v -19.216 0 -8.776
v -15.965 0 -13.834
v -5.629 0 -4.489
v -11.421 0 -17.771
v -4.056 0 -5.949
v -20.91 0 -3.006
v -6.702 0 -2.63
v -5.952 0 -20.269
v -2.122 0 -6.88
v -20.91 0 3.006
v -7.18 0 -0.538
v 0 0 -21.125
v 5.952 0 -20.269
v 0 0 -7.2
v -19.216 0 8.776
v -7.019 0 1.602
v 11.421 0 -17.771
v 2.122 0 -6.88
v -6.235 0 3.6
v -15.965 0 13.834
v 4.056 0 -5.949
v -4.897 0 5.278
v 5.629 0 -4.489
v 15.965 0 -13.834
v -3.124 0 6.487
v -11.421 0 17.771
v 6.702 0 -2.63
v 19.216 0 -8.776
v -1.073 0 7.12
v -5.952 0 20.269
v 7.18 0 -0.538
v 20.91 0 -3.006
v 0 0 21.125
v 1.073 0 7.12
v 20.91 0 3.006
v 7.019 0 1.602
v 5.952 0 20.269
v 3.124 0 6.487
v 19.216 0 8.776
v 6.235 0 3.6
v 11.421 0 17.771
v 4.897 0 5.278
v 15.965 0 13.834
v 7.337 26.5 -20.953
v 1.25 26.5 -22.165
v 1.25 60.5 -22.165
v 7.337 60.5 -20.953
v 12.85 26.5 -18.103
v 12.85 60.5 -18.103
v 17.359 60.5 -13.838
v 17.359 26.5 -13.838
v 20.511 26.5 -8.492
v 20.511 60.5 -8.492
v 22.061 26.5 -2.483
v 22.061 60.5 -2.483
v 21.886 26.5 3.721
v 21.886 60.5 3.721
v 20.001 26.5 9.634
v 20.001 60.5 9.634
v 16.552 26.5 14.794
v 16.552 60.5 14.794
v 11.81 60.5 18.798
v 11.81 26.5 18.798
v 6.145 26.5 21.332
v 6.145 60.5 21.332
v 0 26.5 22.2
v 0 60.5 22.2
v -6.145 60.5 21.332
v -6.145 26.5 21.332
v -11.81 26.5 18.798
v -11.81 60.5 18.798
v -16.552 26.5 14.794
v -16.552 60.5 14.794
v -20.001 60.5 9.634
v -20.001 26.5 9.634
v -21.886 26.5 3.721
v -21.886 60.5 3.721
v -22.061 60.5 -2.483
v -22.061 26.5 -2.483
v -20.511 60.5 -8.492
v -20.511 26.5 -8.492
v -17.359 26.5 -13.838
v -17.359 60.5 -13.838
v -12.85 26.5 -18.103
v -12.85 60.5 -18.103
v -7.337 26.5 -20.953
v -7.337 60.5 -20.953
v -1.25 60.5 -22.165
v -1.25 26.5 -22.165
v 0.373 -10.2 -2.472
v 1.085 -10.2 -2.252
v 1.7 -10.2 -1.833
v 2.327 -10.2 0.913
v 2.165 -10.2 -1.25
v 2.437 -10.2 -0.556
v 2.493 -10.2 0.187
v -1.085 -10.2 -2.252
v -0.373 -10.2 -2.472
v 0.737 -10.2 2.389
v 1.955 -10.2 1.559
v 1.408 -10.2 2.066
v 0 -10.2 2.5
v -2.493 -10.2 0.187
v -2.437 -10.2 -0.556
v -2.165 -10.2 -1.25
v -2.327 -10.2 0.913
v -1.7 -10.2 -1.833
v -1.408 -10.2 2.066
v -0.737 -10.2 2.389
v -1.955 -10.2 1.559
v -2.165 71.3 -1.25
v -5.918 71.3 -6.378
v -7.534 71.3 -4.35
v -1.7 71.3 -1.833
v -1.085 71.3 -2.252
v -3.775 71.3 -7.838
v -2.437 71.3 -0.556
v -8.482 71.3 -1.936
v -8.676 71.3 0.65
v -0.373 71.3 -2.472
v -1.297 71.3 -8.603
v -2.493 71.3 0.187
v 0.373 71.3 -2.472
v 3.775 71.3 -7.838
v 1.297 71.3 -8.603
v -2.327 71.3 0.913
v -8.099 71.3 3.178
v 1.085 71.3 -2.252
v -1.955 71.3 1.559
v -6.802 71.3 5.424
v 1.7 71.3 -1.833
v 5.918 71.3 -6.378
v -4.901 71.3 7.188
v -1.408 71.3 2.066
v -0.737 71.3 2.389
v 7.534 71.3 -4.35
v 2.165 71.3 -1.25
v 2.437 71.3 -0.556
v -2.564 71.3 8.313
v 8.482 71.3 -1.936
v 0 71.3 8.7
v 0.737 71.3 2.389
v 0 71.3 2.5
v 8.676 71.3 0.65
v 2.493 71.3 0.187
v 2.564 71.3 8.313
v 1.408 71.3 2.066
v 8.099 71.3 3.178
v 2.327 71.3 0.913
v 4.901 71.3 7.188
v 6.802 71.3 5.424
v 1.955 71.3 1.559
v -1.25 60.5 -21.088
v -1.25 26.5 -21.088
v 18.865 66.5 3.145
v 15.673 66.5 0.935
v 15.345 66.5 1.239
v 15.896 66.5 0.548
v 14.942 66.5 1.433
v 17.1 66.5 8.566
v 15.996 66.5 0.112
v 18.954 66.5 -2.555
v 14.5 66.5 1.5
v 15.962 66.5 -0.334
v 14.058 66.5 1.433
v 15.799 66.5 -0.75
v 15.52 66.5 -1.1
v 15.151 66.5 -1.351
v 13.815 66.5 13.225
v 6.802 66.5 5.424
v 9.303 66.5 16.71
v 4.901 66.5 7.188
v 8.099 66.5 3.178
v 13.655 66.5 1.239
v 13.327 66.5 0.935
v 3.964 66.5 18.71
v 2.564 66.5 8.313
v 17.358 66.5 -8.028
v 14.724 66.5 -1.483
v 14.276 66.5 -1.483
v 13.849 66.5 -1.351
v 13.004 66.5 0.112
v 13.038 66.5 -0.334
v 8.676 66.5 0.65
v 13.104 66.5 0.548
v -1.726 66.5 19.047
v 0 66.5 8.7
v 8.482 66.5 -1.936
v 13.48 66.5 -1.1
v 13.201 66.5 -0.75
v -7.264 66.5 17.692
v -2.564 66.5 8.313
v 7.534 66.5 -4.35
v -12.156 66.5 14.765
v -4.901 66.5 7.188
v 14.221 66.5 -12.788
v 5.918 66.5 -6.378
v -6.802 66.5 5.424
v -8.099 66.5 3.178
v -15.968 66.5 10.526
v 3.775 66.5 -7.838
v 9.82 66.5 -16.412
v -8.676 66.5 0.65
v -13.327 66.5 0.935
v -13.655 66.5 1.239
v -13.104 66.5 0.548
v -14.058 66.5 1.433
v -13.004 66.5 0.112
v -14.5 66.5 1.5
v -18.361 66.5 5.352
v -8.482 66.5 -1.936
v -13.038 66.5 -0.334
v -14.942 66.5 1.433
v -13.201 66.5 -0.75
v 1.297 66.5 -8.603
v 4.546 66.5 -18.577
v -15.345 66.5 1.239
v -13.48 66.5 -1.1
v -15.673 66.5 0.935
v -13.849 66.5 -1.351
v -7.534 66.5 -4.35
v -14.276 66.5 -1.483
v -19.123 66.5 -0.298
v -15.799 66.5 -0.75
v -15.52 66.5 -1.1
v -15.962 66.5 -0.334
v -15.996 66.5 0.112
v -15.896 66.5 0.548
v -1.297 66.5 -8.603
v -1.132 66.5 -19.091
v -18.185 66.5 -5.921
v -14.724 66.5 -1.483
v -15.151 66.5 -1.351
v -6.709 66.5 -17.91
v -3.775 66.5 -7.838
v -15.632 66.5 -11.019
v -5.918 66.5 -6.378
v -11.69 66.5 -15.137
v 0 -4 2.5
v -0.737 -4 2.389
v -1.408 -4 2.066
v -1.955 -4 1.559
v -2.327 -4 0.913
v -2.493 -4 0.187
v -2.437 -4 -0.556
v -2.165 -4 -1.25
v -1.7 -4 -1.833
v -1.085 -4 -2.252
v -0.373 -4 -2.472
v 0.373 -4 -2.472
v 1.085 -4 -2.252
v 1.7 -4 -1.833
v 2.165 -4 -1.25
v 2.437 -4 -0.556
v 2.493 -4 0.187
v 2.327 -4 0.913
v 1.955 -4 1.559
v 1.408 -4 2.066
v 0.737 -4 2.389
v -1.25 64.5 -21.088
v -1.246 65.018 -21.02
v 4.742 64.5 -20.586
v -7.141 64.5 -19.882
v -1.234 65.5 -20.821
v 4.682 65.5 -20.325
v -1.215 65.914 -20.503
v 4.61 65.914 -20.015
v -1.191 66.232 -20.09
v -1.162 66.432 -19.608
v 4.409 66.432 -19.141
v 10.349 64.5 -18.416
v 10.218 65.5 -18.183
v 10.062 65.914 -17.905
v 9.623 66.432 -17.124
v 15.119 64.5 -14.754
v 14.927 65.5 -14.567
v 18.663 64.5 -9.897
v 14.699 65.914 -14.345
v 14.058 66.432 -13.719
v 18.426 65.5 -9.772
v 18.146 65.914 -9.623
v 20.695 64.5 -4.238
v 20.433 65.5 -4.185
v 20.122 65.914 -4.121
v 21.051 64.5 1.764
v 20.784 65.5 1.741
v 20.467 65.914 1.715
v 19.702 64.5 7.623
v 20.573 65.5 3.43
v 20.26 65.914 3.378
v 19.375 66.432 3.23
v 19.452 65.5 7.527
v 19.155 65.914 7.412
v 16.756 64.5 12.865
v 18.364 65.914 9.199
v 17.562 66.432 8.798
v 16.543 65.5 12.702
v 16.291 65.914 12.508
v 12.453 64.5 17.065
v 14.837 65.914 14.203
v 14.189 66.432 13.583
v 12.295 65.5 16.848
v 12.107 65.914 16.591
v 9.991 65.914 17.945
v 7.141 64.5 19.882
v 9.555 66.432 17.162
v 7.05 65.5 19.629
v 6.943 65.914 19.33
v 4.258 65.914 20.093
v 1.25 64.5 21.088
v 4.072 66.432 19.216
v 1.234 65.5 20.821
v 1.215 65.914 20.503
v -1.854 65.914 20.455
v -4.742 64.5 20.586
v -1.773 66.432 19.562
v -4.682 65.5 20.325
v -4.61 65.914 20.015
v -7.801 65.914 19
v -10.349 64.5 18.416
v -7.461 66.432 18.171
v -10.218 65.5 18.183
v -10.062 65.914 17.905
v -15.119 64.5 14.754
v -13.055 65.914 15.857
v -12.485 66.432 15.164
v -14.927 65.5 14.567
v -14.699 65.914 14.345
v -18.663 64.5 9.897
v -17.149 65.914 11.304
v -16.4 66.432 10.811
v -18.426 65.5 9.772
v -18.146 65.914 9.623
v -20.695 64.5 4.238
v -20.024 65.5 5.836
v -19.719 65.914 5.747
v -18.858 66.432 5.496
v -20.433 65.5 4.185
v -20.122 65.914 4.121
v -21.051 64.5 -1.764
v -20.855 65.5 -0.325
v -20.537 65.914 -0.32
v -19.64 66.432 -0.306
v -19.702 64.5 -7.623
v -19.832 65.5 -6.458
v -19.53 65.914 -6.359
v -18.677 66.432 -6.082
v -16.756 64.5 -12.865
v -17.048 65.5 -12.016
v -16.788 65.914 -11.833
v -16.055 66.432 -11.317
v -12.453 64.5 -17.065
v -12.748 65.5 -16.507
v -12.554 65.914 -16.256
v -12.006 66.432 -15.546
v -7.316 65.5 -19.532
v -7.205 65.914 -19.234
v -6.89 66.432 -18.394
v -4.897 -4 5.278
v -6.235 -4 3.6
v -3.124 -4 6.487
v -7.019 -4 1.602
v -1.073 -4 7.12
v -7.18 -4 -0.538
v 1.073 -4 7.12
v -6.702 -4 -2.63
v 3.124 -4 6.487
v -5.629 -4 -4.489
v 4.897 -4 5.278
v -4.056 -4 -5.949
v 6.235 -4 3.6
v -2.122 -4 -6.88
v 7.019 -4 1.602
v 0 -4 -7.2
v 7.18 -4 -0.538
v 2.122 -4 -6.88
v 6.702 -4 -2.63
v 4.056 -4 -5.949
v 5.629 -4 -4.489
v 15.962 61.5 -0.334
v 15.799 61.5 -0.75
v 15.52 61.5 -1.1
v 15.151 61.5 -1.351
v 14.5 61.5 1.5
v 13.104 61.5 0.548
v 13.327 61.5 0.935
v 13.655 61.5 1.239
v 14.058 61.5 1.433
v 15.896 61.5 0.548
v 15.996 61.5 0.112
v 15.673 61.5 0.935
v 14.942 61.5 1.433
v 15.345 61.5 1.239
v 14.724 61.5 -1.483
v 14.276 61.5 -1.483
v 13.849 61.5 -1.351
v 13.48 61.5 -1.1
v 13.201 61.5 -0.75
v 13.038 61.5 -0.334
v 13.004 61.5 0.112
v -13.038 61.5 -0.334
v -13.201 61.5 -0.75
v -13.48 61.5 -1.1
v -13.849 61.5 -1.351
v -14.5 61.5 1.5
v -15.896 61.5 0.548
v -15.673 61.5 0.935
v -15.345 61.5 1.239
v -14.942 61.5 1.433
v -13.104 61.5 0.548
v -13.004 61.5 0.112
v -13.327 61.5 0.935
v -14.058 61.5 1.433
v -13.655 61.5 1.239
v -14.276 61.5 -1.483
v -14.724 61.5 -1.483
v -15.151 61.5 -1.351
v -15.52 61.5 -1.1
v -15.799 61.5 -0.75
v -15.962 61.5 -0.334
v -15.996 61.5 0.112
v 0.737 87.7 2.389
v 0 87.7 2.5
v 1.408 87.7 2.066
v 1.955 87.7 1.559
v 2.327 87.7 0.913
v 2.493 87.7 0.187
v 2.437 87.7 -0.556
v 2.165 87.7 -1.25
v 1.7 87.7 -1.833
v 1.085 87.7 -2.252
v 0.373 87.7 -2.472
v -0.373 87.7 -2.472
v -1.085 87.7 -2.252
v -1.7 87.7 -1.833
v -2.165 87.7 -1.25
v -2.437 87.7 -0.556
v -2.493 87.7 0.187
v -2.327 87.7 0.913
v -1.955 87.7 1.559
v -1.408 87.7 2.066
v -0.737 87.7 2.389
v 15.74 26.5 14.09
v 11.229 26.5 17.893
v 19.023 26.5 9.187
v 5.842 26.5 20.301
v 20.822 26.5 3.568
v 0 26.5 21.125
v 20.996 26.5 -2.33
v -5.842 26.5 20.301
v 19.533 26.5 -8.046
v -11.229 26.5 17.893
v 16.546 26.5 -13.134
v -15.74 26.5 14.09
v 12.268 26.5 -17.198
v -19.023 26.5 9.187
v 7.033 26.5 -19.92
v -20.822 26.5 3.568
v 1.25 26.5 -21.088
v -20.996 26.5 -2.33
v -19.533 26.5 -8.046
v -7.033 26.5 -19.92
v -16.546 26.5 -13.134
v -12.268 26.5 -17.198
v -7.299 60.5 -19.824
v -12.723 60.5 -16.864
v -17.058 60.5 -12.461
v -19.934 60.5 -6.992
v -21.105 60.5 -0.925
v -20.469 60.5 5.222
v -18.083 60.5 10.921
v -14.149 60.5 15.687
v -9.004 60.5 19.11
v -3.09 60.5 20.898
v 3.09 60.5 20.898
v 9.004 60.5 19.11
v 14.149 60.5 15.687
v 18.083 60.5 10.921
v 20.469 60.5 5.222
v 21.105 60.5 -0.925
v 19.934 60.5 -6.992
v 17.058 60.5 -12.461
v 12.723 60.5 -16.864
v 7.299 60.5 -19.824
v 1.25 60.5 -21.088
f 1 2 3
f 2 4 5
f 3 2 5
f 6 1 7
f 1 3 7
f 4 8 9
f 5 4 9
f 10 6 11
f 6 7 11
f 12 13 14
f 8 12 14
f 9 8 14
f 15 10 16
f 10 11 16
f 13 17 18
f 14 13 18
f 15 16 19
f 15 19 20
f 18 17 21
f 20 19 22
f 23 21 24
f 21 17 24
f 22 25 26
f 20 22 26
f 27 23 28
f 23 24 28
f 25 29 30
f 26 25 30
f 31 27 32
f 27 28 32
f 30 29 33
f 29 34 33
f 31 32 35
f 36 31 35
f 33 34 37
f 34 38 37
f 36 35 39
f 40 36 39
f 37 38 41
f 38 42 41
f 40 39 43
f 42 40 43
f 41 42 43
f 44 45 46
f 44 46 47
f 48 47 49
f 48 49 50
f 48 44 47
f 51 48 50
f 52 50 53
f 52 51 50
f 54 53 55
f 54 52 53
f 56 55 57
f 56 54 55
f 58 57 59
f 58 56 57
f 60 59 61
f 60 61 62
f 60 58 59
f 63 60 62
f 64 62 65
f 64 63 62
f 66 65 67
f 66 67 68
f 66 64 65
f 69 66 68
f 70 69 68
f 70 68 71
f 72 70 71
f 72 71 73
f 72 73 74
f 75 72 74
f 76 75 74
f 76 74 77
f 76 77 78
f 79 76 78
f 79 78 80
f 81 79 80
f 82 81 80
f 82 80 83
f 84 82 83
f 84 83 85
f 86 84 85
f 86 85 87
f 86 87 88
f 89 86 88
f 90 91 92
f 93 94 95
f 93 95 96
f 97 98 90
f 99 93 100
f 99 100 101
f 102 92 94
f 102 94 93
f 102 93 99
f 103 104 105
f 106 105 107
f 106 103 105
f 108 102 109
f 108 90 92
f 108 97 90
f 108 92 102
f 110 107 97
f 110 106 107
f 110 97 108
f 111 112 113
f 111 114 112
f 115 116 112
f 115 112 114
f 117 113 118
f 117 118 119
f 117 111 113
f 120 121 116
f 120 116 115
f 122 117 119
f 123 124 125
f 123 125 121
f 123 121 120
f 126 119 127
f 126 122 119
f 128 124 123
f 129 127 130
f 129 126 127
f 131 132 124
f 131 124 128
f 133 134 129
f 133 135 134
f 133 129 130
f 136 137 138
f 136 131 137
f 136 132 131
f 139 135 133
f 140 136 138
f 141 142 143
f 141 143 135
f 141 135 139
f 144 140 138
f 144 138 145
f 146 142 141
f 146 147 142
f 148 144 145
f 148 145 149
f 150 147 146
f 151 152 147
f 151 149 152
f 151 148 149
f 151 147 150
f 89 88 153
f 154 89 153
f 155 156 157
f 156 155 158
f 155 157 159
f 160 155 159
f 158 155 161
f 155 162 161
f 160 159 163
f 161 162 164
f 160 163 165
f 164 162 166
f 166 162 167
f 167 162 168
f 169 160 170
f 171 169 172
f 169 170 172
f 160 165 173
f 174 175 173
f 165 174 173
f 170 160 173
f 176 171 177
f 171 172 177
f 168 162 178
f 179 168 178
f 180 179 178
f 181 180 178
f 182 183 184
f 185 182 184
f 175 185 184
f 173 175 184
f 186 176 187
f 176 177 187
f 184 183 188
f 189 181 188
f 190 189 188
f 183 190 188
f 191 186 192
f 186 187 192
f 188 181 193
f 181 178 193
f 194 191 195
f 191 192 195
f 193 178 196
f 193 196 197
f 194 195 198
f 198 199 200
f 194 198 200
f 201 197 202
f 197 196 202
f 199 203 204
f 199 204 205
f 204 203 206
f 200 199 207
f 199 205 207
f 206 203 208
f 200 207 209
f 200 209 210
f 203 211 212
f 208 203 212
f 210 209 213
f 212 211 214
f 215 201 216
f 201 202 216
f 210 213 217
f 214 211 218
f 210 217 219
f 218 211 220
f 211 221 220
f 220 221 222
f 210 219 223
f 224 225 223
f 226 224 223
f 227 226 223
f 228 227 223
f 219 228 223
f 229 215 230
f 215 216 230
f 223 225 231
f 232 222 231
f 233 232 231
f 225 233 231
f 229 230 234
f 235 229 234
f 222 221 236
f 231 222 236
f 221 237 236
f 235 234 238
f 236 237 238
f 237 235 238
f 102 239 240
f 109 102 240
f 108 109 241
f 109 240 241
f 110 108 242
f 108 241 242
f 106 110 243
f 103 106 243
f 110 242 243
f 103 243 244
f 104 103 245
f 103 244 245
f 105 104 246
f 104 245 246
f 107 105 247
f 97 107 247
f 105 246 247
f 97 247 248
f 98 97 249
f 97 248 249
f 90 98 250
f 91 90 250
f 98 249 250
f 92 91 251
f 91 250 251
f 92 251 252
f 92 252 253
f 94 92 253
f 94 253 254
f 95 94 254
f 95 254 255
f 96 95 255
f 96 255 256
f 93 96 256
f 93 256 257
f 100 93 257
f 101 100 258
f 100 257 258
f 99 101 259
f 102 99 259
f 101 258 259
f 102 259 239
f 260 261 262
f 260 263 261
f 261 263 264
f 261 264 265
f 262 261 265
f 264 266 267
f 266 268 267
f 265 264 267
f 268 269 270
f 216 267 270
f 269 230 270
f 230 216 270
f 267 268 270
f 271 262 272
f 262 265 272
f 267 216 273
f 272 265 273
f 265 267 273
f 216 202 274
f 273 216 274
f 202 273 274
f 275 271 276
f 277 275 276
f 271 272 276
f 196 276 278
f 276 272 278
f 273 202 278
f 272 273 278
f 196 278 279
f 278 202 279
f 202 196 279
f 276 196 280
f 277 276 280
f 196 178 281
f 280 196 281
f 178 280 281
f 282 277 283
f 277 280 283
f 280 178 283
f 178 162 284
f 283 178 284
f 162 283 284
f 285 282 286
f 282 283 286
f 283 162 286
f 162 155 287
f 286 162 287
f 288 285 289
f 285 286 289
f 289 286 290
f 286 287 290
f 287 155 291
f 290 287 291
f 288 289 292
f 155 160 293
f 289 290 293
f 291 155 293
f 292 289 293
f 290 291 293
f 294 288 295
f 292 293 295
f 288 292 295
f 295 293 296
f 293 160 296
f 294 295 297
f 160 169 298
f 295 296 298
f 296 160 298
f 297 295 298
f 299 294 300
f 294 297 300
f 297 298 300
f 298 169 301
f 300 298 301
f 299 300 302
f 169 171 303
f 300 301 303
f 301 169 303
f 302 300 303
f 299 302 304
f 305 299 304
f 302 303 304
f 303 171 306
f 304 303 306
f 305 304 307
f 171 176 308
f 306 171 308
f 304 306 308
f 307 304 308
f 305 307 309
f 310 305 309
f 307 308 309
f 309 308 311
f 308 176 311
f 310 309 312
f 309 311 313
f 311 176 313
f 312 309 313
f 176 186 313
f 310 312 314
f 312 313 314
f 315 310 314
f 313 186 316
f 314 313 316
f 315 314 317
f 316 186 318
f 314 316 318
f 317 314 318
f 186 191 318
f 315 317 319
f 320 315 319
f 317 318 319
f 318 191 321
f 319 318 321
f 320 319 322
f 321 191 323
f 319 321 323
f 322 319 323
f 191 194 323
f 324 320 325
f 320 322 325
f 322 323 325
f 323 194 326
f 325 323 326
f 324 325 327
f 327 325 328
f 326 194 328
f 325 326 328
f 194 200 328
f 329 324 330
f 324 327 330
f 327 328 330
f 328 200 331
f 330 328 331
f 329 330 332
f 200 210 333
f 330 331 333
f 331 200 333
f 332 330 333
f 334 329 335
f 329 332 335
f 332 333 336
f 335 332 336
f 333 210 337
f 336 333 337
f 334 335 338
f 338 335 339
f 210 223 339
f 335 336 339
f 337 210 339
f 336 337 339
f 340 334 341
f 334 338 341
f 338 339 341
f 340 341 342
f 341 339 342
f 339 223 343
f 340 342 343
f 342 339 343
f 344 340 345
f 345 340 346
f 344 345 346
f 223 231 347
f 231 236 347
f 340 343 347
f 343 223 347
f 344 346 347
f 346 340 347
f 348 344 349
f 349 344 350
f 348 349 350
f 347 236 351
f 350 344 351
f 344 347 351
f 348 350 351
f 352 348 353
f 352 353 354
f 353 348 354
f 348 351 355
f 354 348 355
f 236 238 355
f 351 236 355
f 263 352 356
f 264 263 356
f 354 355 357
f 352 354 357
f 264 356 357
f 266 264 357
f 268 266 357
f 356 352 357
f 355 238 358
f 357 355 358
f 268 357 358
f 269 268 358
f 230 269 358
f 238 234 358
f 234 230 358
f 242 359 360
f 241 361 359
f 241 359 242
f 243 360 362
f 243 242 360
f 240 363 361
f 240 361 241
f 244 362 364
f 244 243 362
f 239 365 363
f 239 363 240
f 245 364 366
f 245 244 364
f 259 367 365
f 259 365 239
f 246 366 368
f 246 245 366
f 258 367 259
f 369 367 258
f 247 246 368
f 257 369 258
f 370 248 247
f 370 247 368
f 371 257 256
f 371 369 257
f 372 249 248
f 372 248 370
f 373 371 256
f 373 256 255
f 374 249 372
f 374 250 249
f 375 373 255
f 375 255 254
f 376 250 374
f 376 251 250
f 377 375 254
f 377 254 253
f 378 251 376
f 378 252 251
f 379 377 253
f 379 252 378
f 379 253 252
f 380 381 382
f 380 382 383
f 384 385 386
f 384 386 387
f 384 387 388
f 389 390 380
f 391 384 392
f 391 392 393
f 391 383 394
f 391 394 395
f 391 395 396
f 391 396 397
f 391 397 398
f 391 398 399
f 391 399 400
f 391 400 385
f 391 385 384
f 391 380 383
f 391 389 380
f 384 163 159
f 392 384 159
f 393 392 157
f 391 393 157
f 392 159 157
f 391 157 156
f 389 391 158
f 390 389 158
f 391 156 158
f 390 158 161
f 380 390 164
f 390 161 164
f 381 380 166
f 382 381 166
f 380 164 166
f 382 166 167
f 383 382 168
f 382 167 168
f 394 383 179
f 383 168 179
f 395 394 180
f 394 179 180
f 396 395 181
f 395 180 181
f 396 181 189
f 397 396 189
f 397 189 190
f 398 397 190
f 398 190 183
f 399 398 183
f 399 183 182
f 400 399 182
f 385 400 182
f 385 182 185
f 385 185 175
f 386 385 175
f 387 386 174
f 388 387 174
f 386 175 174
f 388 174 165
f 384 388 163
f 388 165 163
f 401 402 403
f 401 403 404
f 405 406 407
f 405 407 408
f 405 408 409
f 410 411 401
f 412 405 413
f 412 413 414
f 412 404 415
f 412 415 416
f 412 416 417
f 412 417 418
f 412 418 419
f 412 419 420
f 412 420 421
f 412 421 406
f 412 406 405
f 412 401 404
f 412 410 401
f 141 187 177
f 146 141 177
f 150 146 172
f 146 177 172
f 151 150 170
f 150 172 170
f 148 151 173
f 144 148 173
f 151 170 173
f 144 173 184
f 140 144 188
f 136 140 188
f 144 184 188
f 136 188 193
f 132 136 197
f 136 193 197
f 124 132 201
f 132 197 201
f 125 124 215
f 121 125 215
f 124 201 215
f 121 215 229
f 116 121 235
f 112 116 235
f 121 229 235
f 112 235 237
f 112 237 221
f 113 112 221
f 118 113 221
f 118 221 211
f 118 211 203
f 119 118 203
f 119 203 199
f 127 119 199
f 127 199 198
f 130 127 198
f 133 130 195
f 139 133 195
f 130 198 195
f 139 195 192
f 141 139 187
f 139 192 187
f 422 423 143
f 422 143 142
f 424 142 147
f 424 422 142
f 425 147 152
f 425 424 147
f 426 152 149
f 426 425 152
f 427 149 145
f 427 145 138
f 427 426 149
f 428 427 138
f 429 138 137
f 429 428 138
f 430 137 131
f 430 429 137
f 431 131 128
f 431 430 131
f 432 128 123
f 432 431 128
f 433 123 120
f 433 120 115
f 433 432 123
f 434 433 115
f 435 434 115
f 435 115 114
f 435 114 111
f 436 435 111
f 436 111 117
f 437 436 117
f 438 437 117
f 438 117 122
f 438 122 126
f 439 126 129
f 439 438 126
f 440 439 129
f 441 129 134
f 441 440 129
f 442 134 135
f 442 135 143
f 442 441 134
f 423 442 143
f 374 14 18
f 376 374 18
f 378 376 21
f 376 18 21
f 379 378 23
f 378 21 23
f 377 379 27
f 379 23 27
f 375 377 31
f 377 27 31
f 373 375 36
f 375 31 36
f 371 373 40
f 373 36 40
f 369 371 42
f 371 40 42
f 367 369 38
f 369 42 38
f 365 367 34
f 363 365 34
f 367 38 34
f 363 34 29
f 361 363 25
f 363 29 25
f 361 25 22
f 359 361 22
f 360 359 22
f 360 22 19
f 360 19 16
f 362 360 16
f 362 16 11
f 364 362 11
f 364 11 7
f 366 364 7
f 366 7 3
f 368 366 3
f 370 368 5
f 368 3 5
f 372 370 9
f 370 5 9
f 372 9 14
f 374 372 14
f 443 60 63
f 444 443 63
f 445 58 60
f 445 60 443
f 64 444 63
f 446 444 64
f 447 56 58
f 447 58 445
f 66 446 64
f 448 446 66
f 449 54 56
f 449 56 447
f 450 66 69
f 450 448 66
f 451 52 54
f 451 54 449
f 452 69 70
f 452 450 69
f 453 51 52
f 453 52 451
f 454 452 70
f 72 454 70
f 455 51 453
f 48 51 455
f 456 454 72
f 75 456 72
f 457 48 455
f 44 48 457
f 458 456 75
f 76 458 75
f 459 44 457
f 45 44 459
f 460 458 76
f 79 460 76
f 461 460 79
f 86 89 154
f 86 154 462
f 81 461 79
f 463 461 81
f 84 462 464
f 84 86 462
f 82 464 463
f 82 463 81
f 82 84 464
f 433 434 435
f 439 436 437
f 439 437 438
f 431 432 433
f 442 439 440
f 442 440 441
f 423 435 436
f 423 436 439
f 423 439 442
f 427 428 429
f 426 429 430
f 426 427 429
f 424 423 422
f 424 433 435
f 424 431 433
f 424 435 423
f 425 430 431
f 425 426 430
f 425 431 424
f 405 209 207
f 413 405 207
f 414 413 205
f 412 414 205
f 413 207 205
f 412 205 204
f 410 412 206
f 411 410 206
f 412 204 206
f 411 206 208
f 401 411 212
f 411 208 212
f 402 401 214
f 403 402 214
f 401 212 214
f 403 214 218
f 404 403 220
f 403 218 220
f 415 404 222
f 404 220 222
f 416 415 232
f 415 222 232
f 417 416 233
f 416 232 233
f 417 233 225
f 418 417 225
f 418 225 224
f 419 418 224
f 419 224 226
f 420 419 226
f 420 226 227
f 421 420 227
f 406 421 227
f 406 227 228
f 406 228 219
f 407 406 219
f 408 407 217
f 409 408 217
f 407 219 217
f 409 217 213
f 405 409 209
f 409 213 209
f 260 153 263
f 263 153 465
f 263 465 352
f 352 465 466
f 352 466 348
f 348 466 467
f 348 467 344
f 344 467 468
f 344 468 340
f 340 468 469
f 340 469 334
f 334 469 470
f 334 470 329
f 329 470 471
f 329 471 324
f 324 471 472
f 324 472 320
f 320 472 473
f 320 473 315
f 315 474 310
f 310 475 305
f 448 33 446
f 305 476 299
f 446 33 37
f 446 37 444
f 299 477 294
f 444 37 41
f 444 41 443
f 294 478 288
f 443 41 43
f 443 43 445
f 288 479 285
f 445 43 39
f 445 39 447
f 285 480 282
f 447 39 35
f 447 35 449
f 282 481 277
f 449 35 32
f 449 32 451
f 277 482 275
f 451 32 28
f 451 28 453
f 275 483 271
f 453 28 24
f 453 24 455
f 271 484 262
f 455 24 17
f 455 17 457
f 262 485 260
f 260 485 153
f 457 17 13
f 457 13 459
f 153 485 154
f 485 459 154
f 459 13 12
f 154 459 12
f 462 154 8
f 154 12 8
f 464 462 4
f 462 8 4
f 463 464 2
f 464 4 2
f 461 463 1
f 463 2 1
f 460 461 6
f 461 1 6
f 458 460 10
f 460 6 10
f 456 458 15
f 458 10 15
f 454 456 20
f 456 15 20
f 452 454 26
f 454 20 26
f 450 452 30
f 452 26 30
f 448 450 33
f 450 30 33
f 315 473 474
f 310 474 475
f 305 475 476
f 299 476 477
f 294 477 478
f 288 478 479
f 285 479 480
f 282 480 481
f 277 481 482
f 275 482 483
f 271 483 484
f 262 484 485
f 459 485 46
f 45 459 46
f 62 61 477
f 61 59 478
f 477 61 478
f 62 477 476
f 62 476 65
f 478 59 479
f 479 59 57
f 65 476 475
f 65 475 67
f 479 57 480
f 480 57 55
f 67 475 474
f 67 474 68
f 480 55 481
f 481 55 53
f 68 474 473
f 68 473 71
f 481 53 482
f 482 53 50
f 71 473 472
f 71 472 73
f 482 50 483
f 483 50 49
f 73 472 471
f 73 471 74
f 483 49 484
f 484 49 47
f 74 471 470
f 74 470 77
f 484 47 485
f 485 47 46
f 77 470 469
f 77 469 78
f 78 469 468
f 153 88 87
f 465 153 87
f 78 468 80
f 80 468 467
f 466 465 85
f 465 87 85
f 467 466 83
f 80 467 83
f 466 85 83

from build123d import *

# Parameters (mm, degrees)
SKETCH1_R           = 21.125
BOSS_EXTRUDE1_DEPTH = 66.5
SKETCH2_R           = 7.2
BOSS_EXTRUDE2_DEPTH = 4
SKETCH3_R           = 2.5
BOSS_EXTRUDE3_DEPTH = 6.2
SKETCH4_R           = 8.7
BOSS_EXTRUDE4_DEPTH = 4.8
BOSS_EXTRUDE5_START = 16.4
SKETCH5_R           = 2.5
BOSS_EXTRUDE5_DEPTH = 16.4
SKETCH6_R           = 1.5
CUT_EXTRUDE1_DEPTH  = 5
BOSS_EXTRUDE6_START = -40
BOSS_EXTRUDE6_DEPTH = 40
CUT_EXTRUDE2_START  = -6
CUT_EXTRUDE2_DEPTH  = 6
FILLET1_R           = 2


with BuildPart() as part:
    # Sketch1 → Boss-Extrude1 (new body)
    with BuildSketch(Plane(origin=(0, 0, 0), x_dir=(1, 0, 0), z_dir=(0, 1, 0))):
        with Locations(Location((0, 0, 0), (0, 0, 270))):
            Circle(SKETCH1_R)
    extrude(amount=BOSS_EXTRUDE1_DEPTH)

    # Sketch2 → Boss-Extrude2 (add)
    with BuildSketch(Plane.XZ):
        with Locations(Location((0, 0, 0), (0, 0, 270))):
            Circle(SKETCH2_R)
    extrude(amount=BOSS_EXTRUDE2_DEPTH)

    # Sketch3 → Boss-Extrude3 (add)
    with BuildSketch(Plane.XZ.offset(4)):
        with Locations(Location((0, 0, 0), (0, 0, 90))):
            Circle(SKETCH3_R)
    extrude(amount=BOSS_EXTRUDE3_DEPTH)

    # Sketch4 → Boss-Extrude4 (add)
    with BuildSketch(Plane(origin=(0, 66.5, 0), x_dir=(1, 0, 0), z_dir=(0, 1, 0))):
        with Locations(Location((0, 0, 0), (0, 0, 270))):
            Circle(SKETCH4_R)
    extrude(amount=BOSS_EXTRUDE4_DEPTH)

    # Sketch5 → Boss-Extrude5 (add)
    with BuildSketch(Plane(origin=(0, 71.3, 0), x_dir=(1, 0, 0), z_dir=(0, 1, 0)).offset(BOSS_EXTRUDE5_START)):
        with Locations(Location((0, 0, 0), (0, 0, 270))):
            Circle(SKETCH5_R)
    extrude(amount=-BOSS_EXTRUDE5_DEPTH)

    # Sketch6 → Cut-Extrude1 (cut)
    with BuildSketch(Plane(origin=(0, 66.5, 0), x_dir=(1, 0, 0), z_dir=(0, 1, 0))):
        with Locations(Location((14.5, 0, 0), (0, 0, 270))):
            Circle(SKETCH6_R)
        with Locations(Location((-14.5, 0, 0), (0, 0, 270))):
            Circle(SKETCH6_R)
    extrude(amount=-CUT_EXTRUDE1_DEPTH, mode=Mode.SUBTRACT)

    # Sketch7 → Boss-Extrude6 (add)
    with BuildSketch(Plane(origin=(0, 66.5, 0), x_dir=(1, 0, 0), z_dir=(0, 1, 0)).offset(BOSS_EXTRUDE6_START)):
        with BuildLine():
            Line((1.25, 21.087985323), (1.25, 22.164780622))
            ThreePointArc((1.25, 22.164780622), (0, -22.2), (-1.25, 22.164780622))
            Line((-1.25, 22.164780622), (-1.25, 21.087985323))
            ThreePointArc((-1.25, 21.087985323), (0, -21.125), (1.25, 21.087985323))
        make_face()
    extrude(amount=BOSS_EXTRUDE6_DEPTH)

    # Sketch7<3> → Cut-Extrude2 (cut)
    with BuildSketch(Plane(origin=(0, 66.5, 0), x_dir=(1, 0, 0), z_dir=(0, 1, 0)).offset(CUT_EXTRUDE2_START)):
        with BuildLine():
            Line((1.25, 21.087985323), (1.25, 22.164780622))
            ThreePointArc((1.25, 22.164780622), (0, -22.2), (-1.25, 22.164780622))
            Line((-1.25, 22.164780622), (-1.25, 21.087985323))
            ThreePointArc((-1.25, 21.087985323), (0, -21.125), (1.25, 21.087985323))
        make_face()
    extrude(amount=CUT_EXTRUDE2_DEPTH, mode=Mode.SUBTRACT)

    # Fillet1
    fillet1_edges = [part.edges().sort_by_distance(p)[0] for p in [
        (1.25, 66.5, 21.087985323),
    ]]
    fillet(fillet1_edges, radius=FILLET1_R)


solid = part.part
